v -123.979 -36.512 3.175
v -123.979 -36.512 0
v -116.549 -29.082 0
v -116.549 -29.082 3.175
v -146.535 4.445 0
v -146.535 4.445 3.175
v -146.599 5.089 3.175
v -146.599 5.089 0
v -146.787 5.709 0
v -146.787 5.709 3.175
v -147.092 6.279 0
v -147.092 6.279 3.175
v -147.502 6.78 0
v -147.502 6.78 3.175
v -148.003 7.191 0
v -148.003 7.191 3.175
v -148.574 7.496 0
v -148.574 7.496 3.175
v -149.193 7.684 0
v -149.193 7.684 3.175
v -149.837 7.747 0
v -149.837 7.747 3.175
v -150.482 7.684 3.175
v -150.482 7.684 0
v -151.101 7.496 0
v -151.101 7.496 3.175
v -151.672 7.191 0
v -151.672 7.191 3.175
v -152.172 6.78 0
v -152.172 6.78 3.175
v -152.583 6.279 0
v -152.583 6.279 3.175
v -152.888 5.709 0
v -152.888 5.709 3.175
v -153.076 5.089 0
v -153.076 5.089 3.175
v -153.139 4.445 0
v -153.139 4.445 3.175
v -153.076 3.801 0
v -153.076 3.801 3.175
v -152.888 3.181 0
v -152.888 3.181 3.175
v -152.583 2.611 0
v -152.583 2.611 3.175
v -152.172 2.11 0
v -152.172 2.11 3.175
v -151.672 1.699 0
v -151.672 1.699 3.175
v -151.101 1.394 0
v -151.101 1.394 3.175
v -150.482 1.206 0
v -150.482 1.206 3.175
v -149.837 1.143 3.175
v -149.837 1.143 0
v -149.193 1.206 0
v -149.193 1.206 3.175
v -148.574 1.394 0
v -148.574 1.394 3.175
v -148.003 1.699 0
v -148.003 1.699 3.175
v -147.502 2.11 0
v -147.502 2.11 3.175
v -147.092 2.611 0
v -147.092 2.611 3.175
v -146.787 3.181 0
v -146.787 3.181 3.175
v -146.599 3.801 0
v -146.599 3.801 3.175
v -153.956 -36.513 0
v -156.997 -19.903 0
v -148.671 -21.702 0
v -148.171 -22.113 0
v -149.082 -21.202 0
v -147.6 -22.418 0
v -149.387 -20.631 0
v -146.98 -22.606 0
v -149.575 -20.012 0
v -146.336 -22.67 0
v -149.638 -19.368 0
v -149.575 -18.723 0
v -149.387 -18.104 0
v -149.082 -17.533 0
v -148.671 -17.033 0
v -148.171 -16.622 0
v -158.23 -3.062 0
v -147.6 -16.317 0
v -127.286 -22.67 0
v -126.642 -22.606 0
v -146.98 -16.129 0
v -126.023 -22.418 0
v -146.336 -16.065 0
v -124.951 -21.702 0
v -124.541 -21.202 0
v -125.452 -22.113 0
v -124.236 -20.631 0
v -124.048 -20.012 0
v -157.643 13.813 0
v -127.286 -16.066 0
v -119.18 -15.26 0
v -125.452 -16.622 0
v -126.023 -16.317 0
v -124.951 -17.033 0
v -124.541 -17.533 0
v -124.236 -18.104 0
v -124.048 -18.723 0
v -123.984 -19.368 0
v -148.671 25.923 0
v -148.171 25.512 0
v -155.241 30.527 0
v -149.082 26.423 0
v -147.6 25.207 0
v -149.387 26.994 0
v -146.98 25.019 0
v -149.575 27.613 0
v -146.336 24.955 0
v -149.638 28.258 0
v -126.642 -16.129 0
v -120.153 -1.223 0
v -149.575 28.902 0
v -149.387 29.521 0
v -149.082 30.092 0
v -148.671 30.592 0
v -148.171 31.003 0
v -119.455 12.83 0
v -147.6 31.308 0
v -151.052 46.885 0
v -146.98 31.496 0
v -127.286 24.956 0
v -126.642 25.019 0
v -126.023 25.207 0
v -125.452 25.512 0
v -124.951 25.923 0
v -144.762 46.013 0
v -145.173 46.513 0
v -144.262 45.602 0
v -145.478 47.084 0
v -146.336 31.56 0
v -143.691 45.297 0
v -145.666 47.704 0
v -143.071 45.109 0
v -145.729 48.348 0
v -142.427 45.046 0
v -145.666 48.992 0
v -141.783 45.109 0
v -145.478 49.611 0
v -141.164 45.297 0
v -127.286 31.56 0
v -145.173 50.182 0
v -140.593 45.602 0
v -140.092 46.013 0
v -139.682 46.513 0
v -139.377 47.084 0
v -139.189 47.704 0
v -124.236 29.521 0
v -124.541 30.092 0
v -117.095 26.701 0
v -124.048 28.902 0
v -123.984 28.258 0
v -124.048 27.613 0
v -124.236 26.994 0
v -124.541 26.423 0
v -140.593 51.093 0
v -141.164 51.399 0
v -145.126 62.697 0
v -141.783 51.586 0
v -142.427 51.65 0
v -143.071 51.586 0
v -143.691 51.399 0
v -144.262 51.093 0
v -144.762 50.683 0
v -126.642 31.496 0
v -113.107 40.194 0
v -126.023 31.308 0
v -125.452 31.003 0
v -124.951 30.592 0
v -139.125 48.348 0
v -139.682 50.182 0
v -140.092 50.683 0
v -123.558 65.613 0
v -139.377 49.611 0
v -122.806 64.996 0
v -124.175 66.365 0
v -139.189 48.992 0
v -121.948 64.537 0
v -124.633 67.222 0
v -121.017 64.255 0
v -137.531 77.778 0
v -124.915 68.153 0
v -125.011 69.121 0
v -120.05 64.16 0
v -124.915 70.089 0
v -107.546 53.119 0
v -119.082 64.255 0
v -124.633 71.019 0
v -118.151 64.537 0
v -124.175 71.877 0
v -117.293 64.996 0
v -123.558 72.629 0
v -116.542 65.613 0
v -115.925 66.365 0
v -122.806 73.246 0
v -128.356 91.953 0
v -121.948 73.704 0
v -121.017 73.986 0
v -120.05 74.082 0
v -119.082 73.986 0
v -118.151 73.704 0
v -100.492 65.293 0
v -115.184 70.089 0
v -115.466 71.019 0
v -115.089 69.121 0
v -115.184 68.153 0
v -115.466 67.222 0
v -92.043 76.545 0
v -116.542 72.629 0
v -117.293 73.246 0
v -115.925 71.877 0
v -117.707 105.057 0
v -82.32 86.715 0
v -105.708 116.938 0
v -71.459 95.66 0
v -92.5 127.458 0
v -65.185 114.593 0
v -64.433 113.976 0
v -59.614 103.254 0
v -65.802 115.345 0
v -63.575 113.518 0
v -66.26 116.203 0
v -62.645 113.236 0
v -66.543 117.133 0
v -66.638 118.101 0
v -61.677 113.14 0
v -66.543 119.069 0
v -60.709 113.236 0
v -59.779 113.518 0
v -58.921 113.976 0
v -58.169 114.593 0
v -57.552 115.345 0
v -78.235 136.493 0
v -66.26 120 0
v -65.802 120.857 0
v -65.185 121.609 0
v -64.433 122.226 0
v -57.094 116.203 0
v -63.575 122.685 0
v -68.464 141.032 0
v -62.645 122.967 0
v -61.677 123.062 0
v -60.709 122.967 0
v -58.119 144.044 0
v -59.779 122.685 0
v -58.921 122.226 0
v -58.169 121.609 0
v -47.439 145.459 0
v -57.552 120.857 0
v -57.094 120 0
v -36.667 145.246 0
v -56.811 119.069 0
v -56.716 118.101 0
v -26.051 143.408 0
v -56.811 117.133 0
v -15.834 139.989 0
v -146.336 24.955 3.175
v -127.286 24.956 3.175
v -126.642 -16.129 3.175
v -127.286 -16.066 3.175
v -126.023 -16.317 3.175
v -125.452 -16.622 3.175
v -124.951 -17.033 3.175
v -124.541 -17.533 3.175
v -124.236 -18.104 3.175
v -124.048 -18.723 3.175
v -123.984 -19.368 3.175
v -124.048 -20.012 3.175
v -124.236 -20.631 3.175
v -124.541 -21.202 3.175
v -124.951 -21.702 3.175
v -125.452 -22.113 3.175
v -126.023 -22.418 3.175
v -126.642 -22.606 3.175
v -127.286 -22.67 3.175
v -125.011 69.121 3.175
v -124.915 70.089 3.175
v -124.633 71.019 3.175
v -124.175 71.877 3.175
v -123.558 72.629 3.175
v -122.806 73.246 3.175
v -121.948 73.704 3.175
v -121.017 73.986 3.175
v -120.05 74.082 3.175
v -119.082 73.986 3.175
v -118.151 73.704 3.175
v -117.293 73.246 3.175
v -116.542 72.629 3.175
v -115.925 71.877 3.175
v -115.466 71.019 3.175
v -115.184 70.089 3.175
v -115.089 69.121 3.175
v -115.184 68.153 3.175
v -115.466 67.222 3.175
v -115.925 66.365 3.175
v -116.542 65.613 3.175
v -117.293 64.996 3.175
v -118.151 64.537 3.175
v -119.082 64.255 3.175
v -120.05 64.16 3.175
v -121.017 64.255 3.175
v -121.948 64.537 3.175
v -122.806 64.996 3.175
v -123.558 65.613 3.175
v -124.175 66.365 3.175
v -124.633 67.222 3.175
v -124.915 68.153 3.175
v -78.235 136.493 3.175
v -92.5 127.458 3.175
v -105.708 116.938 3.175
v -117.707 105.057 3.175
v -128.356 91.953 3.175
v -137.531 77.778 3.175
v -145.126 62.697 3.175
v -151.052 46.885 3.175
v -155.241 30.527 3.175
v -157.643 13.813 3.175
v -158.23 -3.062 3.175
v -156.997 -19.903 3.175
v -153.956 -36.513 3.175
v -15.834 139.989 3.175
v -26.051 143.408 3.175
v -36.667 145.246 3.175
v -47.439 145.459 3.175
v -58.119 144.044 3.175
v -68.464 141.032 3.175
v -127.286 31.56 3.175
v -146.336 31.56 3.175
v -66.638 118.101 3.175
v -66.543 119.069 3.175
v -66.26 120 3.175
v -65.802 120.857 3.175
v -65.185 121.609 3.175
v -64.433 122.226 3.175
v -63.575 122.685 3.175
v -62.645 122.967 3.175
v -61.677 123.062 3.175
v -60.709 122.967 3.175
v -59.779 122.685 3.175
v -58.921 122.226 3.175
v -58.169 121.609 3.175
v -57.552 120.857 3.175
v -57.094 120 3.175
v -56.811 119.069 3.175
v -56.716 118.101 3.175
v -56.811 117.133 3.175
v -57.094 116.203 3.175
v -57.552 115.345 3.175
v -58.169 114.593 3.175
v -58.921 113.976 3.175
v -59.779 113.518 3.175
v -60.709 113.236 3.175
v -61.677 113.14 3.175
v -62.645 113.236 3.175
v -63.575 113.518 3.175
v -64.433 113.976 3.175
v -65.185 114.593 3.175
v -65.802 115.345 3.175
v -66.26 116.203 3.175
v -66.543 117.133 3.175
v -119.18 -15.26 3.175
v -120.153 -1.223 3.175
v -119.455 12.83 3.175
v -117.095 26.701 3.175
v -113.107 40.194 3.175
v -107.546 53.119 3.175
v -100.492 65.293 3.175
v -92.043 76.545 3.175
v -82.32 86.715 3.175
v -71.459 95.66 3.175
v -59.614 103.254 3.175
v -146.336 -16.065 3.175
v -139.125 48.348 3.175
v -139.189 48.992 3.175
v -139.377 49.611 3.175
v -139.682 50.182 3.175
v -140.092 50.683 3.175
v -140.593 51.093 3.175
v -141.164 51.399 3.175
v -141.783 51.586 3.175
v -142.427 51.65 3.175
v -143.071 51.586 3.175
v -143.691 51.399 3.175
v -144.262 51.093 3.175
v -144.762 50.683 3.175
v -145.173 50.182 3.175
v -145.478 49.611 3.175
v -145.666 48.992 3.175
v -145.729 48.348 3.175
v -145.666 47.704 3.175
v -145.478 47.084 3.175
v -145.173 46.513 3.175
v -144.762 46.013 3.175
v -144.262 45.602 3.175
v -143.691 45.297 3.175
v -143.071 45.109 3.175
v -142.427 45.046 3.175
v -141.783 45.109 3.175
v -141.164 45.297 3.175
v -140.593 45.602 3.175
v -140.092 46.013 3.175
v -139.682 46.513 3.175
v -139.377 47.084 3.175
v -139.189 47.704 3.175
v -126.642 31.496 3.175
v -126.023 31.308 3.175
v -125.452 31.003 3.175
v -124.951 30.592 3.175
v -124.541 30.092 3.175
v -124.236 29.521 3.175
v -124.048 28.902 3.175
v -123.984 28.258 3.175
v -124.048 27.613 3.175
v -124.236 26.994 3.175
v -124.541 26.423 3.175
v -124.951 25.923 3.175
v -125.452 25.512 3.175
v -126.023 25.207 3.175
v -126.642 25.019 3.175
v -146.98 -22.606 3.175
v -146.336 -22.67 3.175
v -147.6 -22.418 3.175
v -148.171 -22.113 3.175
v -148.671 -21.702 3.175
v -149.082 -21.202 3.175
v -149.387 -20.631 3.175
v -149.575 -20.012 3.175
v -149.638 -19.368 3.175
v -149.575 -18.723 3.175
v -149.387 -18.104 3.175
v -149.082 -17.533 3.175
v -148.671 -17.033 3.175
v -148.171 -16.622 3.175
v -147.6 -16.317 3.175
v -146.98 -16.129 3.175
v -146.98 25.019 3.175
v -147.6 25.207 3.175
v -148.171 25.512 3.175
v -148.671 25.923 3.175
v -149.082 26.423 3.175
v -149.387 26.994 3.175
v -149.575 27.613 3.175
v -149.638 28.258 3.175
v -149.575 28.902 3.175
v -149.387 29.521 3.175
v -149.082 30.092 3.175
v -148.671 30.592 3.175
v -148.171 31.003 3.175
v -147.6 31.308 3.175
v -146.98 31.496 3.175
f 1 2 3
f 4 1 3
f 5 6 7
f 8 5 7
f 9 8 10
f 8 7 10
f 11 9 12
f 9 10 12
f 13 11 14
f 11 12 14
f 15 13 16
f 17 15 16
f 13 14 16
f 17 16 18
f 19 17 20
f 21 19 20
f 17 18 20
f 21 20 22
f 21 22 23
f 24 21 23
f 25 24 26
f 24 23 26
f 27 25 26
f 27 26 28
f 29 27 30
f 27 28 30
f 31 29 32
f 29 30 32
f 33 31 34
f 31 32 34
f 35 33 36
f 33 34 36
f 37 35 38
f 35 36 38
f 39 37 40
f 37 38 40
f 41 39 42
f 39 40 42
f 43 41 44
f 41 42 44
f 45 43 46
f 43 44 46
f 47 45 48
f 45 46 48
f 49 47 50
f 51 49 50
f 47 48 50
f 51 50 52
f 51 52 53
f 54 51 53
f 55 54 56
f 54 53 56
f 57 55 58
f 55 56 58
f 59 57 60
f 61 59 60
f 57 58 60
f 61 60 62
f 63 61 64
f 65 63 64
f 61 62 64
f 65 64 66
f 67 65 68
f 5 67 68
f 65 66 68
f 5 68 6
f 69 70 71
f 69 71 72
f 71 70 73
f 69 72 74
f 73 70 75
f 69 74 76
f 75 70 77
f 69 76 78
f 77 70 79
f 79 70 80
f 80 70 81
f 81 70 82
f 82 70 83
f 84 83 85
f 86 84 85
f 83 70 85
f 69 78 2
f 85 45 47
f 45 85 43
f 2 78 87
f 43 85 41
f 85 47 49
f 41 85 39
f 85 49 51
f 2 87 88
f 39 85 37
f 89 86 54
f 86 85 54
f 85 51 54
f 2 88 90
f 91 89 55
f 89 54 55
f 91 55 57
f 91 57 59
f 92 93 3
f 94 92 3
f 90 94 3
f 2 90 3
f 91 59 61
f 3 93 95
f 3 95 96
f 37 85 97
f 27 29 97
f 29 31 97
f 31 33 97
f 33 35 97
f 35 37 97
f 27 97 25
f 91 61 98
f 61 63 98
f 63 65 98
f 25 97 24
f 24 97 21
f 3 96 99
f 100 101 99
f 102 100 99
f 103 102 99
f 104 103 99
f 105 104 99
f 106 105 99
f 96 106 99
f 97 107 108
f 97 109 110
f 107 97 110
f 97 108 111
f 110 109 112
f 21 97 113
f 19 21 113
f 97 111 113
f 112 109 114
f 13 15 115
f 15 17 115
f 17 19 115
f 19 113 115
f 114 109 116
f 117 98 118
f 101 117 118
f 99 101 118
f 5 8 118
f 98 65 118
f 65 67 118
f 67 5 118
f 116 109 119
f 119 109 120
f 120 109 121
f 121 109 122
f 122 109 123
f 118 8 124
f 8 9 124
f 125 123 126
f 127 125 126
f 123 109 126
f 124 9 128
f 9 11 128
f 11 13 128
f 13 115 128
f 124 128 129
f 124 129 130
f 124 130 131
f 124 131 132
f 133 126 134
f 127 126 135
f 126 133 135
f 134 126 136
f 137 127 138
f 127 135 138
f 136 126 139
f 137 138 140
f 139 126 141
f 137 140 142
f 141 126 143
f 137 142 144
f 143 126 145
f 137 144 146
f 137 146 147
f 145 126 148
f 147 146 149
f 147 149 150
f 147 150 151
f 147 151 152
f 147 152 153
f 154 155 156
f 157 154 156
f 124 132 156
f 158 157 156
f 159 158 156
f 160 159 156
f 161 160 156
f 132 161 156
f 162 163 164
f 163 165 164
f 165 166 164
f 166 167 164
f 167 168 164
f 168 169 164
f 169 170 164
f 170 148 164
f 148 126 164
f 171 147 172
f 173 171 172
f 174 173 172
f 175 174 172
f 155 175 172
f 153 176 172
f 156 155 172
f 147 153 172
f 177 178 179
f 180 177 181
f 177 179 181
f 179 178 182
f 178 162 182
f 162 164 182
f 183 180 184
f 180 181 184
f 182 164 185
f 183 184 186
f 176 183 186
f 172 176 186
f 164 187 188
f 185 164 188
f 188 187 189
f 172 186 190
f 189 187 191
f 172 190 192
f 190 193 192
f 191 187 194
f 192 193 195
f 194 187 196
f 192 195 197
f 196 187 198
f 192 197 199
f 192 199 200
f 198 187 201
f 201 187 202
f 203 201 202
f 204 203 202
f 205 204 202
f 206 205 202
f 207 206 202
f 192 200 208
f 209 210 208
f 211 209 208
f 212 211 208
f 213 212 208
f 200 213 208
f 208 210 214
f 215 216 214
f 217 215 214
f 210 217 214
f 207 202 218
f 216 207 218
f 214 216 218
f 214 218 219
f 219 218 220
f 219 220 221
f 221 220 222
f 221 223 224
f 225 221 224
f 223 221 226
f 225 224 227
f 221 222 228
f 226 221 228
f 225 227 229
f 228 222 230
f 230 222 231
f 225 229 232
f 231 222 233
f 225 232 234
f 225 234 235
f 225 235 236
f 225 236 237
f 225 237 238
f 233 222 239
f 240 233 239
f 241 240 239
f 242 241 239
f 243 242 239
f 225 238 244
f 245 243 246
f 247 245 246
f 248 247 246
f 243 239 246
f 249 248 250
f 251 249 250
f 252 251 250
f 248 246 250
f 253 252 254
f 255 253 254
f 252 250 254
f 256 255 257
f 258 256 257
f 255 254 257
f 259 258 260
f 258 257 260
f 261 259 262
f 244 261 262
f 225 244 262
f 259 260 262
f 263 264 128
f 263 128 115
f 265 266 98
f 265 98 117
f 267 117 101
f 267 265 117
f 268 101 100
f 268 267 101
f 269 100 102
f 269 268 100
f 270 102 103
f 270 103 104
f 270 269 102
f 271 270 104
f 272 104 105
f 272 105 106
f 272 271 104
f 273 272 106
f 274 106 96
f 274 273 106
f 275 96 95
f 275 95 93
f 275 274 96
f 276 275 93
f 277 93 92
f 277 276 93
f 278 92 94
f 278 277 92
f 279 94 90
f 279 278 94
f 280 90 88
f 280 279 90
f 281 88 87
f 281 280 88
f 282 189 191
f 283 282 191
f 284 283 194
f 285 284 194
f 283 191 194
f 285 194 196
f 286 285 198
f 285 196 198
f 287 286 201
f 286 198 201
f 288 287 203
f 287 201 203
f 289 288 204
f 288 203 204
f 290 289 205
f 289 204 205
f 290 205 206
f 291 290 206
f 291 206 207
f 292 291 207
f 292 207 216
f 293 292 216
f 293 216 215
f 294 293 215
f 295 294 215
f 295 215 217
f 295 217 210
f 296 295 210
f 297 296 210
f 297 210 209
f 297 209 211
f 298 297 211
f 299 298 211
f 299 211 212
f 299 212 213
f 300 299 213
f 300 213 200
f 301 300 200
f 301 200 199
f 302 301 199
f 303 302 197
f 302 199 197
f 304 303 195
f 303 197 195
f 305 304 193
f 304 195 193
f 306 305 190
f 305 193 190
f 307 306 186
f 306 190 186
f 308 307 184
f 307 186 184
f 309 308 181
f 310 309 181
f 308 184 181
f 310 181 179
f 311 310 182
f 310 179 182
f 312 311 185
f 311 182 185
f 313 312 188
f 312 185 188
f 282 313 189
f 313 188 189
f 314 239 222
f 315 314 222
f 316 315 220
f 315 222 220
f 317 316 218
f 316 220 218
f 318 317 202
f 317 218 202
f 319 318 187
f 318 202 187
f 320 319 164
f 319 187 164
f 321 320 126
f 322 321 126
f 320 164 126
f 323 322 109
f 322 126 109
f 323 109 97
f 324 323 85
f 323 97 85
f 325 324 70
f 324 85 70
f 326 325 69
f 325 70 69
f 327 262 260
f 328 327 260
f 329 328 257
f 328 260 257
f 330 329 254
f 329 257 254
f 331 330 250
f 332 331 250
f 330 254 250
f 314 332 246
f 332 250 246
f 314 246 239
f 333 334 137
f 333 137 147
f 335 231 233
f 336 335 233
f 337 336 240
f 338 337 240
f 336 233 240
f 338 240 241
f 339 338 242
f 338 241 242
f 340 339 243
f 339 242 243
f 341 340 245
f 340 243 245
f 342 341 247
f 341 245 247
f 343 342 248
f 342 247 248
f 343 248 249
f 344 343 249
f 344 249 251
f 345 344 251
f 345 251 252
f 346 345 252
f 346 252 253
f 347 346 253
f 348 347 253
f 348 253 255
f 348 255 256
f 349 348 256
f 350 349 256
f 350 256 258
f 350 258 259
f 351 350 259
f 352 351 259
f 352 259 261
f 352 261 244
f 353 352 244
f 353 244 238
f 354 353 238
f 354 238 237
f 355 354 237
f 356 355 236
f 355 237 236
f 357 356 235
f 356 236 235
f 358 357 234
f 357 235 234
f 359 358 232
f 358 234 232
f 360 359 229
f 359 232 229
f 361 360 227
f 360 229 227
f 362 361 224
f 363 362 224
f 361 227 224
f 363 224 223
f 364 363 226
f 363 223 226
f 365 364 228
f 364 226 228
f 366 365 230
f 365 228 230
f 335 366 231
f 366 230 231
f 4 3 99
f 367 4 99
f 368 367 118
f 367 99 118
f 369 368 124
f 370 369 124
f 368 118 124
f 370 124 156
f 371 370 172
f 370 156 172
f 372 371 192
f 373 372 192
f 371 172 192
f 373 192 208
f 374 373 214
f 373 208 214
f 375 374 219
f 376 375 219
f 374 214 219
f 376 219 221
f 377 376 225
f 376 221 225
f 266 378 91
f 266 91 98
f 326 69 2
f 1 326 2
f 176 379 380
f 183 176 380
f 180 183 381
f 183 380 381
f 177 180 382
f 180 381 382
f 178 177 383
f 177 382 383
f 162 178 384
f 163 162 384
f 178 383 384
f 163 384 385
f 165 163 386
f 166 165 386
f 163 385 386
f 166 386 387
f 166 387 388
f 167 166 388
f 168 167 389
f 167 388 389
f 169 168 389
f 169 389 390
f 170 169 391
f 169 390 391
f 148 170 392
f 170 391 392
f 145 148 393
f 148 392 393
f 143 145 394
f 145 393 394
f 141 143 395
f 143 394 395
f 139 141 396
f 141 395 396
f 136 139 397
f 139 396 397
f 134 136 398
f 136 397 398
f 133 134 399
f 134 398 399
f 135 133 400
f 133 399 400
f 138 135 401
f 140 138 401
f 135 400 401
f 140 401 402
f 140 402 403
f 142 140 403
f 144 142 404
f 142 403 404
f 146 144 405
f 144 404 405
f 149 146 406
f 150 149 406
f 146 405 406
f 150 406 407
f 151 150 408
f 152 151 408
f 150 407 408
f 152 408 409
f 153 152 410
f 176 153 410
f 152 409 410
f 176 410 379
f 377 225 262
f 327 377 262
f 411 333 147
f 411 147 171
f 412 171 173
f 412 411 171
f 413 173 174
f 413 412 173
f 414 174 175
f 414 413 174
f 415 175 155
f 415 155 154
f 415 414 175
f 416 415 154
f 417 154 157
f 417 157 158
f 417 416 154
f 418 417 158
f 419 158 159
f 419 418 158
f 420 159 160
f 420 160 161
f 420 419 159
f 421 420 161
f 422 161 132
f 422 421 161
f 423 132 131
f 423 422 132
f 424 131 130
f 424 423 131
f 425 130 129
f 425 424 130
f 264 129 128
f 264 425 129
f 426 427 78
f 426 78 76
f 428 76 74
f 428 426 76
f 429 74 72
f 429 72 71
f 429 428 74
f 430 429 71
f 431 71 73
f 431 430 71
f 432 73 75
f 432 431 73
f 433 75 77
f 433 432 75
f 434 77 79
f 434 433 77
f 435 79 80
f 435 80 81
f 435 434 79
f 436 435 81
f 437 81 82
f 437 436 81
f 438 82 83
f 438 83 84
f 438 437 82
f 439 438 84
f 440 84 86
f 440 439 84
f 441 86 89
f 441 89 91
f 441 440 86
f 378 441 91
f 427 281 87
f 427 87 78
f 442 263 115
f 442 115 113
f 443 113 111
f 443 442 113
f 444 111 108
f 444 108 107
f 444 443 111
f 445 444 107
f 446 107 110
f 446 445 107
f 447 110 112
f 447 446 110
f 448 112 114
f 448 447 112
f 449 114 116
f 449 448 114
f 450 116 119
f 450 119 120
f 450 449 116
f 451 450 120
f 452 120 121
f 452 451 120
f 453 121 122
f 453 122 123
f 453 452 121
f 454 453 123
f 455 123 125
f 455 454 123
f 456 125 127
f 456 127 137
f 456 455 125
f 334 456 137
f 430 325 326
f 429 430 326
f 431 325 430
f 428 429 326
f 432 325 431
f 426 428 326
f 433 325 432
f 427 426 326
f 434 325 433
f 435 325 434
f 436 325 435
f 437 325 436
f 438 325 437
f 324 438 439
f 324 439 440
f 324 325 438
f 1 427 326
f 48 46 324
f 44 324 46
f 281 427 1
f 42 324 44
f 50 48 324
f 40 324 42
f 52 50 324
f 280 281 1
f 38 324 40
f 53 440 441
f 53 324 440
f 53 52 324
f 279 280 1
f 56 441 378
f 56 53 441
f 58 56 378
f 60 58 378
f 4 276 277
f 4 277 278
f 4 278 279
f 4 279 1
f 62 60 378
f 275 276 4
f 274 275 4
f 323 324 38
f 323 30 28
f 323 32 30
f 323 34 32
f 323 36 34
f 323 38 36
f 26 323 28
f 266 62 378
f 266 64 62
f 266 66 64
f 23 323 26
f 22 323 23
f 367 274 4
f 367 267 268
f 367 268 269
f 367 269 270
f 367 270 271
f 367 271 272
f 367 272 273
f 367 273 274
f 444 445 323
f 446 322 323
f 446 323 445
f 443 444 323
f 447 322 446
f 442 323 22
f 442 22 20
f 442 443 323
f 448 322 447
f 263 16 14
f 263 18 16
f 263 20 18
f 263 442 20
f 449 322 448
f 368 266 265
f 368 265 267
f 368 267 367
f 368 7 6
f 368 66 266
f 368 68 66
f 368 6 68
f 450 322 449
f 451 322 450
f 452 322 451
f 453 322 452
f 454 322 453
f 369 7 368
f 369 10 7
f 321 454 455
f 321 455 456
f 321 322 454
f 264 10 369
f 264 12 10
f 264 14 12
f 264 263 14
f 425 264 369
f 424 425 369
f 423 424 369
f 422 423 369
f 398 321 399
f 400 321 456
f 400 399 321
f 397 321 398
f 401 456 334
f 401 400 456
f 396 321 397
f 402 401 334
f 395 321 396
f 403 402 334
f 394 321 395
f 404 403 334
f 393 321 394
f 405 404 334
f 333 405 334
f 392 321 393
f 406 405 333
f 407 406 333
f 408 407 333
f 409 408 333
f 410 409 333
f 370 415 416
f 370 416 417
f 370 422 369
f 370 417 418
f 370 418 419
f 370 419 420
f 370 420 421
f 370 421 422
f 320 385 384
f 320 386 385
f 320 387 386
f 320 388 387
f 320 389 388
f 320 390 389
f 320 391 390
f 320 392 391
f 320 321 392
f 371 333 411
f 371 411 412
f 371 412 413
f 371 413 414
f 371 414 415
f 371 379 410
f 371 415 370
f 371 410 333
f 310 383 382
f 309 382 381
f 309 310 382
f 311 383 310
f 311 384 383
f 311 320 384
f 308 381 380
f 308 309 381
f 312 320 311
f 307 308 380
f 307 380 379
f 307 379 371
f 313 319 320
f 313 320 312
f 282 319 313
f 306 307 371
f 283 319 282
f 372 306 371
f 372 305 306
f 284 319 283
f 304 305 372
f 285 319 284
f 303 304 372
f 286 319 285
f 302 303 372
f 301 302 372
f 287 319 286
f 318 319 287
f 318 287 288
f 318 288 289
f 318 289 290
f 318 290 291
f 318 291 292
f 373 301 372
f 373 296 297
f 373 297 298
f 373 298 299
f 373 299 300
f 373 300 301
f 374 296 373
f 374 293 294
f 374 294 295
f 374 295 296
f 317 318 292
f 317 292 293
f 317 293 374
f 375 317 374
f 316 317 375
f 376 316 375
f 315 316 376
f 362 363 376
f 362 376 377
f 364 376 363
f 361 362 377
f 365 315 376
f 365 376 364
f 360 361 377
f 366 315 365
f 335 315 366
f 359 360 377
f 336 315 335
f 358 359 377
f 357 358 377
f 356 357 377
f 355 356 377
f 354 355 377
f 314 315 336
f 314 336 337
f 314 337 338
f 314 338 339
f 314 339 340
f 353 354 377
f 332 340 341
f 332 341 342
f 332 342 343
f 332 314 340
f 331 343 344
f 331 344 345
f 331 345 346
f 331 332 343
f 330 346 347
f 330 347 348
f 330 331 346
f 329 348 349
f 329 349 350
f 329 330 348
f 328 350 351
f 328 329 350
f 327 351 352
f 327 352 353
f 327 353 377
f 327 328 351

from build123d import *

# Parameters (mm, degrees)
BOSS_EXTRUDE1_DEPTH              = 3.175
CUT_EXTRUDE1_DEPTH               = 3.175
SKETCH4_R                        = 3.302
CUT_EXTRUDE2_DEPTH               = 3.175
F_25_64_0_39063_DIAMETER_HOLE1_D = 9.922002


with BuildPart() as part:
    # Sketch1 → Boss-Extrude1 (new body)
    with BuildSketch(Plane.XY):
        with BuildLine():
            Line((-153.9561854, -36.5125), (-123.978950074, -36.5125))
            Line((-123.978950074, -36.5125), (-116.548747531, -29.082297457))
            ThreePointArc((-116.548747531, -29.082297457), (-110.518418653, 46.73895163), (-59.613700036, 103.253872686))
            Line((-59.613700036, 103.253872686), (-15.834260112, 139.989184579))
            ThreePointArc((-15.834260112, 139.989184579), (-47.43896166, 145.45922618), (-78.234917279, 136.493311135))
            ThreePointArc((-78.234917279, 136.493311135), (-145.12613966, 62.696527677), (-153.9561854, -36.5125))
        make_face()
    extrude(amount=BOSS_EXTRUDE1_DEPTH)

    # Sketch2 → Cut-Extrude1 (cut)
    with BuildSketch(Plane.XY.offset(3.175)):
        with BuildLine():
            Line((-146.3361854, -16.0655), (-127.2861854, -16.0655))
            ThreePointArc((-127.2861854, -16.0655), (-123.9841854, -19.3675), (-127.2861854, -22.6695))
            Line((-127.2861854, -22.6695), (-146.3361854, -22.6695))
            ThreePointArc((-146.3361854, -22.6695), (-149.6381854, -19.3675), (-146.3361854, -16.0655))
        make_face()
        with BuildLine():
            Line((-146.3361854, 31.5595), (-127.2861854, 31.5595))
            ThreePointArc((-127.2861854, 31.5595), (-123.9841854, 28.2575), (-127.2861854, 24.9555))
            Line((-127.2861854, 24.9555), (-146.3361854, 24.9555))
            ThreePointArc((-146.3361854, 24.9555), (-149.6381854, 28.2575), (-146.3361854, 31.5595))
        make_face()
    extrude(amount=-CUT_EXTRUDE1_DEPTH, mode=Mode.SUBTRACT)

    # Sketch4 → Cut-Extrude2 (cut)
    with BuildSketch(Plane.XY.offset(3.175)):
        with Locations((-149.837364131, 4.445)):
            Circle(SKETCH4_R)
        with Locations((-142.427155303, 48.347866959)):
            Circle(SKETCH4_R)
    extrude(amount=-CUT_EXTRUDE2_DEPTH, mode=Mode.SUBTRACT)

    # 25/64 (0.39063) Diameter Hole1 (through all)
    with Locations(Plane.XY.offset(3.175)):
        with Locations((-120.049591928, 69.120810664), (-61.677005362, 118.101226522)):
            Hole(F_25_64_0_39063_DIAMETER_HOLE1_D / 2)


solid = part.part
